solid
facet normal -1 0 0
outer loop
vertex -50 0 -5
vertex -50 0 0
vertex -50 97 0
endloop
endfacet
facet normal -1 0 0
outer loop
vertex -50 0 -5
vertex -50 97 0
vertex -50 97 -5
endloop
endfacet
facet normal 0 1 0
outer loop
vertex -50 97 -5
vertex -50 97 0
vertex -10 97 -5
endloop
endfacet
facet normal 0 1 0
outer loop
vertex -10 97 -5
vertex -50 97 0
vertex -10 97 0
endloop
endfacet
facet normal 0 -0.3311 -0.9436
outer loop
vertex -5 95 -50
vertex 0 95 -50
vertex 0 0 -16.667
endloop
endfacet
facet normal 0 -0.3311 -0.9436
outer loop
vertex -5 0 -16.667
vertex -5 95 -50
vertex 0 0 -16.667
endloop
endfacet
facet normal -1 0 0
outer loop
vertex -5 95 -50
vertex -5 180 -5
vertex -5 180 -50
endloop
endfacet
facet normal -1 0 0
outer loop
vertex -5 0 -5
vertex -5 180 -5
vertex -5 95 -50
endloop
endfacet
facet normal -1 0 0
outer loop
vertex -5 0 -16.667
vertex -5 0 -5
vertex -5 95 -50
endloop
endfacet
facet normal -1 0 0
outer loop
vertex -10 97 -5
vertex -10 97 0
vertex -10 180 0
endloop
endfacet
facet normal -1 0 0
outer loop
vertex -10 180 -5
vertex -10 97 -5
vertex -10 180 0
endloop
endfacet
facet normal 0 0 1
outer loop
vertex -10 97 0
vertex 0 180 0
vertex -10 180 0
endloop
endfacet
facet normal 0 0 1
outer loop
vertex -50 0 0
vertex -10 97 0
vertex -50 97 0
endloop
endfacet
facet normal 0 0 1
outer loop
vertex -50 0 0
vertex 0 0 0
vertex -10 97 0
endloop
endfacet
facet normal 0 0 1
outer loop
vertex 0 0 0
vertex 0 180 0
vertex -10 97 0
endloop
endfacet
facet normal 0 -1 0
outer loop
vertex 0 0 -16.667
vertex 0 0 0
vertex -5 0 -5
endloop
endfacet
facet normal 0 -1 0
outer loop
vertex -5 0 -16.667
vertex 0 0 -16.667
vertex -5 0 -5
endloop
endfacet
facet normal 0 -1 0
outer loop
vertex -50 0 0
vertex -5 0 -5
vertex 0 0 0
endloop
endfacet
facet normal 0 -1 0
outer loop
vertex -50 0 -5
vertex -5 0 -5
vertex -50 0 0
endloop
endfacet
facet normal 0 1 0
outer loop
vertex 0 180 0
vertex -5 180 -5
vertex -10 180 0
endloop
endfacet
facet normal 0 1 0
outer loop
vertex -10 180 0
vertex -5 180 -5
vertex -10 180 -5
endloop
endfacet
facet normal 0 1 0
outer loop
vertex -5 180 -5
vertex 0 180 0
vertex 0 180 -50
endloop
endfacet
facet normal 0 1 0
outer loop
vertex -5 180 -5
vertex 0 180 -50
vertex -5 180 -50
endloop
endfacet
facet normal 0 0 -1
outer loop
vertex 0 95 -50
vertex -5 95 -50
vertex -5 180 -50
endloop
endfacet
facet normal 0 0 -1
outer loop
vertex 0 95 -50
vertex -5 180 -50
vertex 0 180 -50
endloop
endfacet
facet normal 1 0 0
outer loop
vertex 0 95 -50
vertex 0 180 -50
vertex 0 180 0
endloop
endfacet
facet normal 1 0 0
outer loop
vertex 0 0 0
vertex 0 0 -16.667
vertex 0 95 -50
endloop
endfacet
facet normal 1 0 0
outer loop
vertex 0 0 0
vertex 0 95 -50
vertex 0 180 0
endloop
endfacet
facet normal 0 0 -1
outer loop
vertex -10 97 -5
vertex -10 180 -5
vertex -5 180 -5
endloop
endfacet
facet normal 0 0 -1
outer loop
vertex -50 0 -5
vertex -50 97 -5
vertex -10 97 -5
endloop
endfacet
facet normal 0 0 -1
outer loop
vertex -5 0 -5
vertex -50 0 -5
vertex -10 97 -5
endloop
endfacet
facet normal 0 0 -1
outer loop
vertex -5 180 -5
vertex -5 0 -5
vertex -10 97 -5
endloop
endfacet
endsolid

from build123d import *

# Parameters (mm, degrees)
SALIENTE_EXTRUIR1_DEPTH = 180
CORTAR_EXTRUIR1_DEPTH   = 5
CROQUIS3_W              = 40
CROQUIS3_H              = 83
CORTAR_EXTRUIR2_DEPTH   = 5


with BuildPart() as part:
    # Croquis1 → Saliente-Extruir1 (new body)
    with BuildSketch(Plane(origin=(0, 0, 0), x_dir=(1, 0, 0), z_dir=(0, 1, 0))):
        Polygon((0, 0), (-50, 0), (-50, 5), (-5, 5), (-5, 50), (0, 50), align=None)
    extrude(amount=SALIENTE_EXTRUIR1_DEPTH)

    # Croquis2 → Cortar-Extruir1 (cut)
    with BuildSketch(Plane(origin=(0, 0, 0), x_dir=(0, 0, -1), z_dir=(1, 0, 0))):
        Polygon((50, 95), (16.666666667, 0), (50, 0), align=None)
    extrude(amount=-CORTAR_EXTRUIR1_DEPTH, mode=Mode.SUBTRACT)

    # Croquis3 → Cortar-Extruir2 (cut)
    with BuildSketch(Plane.XY):
        with Locations((-30, 138.5)):
            Rectangle(CROQUIS3_W, CROQUIS3_H)
    extrude(amount=-CORTAR_EXTRUIR2_DEPTH, mode=Mode.SUBTRACT)


solid = part.part
